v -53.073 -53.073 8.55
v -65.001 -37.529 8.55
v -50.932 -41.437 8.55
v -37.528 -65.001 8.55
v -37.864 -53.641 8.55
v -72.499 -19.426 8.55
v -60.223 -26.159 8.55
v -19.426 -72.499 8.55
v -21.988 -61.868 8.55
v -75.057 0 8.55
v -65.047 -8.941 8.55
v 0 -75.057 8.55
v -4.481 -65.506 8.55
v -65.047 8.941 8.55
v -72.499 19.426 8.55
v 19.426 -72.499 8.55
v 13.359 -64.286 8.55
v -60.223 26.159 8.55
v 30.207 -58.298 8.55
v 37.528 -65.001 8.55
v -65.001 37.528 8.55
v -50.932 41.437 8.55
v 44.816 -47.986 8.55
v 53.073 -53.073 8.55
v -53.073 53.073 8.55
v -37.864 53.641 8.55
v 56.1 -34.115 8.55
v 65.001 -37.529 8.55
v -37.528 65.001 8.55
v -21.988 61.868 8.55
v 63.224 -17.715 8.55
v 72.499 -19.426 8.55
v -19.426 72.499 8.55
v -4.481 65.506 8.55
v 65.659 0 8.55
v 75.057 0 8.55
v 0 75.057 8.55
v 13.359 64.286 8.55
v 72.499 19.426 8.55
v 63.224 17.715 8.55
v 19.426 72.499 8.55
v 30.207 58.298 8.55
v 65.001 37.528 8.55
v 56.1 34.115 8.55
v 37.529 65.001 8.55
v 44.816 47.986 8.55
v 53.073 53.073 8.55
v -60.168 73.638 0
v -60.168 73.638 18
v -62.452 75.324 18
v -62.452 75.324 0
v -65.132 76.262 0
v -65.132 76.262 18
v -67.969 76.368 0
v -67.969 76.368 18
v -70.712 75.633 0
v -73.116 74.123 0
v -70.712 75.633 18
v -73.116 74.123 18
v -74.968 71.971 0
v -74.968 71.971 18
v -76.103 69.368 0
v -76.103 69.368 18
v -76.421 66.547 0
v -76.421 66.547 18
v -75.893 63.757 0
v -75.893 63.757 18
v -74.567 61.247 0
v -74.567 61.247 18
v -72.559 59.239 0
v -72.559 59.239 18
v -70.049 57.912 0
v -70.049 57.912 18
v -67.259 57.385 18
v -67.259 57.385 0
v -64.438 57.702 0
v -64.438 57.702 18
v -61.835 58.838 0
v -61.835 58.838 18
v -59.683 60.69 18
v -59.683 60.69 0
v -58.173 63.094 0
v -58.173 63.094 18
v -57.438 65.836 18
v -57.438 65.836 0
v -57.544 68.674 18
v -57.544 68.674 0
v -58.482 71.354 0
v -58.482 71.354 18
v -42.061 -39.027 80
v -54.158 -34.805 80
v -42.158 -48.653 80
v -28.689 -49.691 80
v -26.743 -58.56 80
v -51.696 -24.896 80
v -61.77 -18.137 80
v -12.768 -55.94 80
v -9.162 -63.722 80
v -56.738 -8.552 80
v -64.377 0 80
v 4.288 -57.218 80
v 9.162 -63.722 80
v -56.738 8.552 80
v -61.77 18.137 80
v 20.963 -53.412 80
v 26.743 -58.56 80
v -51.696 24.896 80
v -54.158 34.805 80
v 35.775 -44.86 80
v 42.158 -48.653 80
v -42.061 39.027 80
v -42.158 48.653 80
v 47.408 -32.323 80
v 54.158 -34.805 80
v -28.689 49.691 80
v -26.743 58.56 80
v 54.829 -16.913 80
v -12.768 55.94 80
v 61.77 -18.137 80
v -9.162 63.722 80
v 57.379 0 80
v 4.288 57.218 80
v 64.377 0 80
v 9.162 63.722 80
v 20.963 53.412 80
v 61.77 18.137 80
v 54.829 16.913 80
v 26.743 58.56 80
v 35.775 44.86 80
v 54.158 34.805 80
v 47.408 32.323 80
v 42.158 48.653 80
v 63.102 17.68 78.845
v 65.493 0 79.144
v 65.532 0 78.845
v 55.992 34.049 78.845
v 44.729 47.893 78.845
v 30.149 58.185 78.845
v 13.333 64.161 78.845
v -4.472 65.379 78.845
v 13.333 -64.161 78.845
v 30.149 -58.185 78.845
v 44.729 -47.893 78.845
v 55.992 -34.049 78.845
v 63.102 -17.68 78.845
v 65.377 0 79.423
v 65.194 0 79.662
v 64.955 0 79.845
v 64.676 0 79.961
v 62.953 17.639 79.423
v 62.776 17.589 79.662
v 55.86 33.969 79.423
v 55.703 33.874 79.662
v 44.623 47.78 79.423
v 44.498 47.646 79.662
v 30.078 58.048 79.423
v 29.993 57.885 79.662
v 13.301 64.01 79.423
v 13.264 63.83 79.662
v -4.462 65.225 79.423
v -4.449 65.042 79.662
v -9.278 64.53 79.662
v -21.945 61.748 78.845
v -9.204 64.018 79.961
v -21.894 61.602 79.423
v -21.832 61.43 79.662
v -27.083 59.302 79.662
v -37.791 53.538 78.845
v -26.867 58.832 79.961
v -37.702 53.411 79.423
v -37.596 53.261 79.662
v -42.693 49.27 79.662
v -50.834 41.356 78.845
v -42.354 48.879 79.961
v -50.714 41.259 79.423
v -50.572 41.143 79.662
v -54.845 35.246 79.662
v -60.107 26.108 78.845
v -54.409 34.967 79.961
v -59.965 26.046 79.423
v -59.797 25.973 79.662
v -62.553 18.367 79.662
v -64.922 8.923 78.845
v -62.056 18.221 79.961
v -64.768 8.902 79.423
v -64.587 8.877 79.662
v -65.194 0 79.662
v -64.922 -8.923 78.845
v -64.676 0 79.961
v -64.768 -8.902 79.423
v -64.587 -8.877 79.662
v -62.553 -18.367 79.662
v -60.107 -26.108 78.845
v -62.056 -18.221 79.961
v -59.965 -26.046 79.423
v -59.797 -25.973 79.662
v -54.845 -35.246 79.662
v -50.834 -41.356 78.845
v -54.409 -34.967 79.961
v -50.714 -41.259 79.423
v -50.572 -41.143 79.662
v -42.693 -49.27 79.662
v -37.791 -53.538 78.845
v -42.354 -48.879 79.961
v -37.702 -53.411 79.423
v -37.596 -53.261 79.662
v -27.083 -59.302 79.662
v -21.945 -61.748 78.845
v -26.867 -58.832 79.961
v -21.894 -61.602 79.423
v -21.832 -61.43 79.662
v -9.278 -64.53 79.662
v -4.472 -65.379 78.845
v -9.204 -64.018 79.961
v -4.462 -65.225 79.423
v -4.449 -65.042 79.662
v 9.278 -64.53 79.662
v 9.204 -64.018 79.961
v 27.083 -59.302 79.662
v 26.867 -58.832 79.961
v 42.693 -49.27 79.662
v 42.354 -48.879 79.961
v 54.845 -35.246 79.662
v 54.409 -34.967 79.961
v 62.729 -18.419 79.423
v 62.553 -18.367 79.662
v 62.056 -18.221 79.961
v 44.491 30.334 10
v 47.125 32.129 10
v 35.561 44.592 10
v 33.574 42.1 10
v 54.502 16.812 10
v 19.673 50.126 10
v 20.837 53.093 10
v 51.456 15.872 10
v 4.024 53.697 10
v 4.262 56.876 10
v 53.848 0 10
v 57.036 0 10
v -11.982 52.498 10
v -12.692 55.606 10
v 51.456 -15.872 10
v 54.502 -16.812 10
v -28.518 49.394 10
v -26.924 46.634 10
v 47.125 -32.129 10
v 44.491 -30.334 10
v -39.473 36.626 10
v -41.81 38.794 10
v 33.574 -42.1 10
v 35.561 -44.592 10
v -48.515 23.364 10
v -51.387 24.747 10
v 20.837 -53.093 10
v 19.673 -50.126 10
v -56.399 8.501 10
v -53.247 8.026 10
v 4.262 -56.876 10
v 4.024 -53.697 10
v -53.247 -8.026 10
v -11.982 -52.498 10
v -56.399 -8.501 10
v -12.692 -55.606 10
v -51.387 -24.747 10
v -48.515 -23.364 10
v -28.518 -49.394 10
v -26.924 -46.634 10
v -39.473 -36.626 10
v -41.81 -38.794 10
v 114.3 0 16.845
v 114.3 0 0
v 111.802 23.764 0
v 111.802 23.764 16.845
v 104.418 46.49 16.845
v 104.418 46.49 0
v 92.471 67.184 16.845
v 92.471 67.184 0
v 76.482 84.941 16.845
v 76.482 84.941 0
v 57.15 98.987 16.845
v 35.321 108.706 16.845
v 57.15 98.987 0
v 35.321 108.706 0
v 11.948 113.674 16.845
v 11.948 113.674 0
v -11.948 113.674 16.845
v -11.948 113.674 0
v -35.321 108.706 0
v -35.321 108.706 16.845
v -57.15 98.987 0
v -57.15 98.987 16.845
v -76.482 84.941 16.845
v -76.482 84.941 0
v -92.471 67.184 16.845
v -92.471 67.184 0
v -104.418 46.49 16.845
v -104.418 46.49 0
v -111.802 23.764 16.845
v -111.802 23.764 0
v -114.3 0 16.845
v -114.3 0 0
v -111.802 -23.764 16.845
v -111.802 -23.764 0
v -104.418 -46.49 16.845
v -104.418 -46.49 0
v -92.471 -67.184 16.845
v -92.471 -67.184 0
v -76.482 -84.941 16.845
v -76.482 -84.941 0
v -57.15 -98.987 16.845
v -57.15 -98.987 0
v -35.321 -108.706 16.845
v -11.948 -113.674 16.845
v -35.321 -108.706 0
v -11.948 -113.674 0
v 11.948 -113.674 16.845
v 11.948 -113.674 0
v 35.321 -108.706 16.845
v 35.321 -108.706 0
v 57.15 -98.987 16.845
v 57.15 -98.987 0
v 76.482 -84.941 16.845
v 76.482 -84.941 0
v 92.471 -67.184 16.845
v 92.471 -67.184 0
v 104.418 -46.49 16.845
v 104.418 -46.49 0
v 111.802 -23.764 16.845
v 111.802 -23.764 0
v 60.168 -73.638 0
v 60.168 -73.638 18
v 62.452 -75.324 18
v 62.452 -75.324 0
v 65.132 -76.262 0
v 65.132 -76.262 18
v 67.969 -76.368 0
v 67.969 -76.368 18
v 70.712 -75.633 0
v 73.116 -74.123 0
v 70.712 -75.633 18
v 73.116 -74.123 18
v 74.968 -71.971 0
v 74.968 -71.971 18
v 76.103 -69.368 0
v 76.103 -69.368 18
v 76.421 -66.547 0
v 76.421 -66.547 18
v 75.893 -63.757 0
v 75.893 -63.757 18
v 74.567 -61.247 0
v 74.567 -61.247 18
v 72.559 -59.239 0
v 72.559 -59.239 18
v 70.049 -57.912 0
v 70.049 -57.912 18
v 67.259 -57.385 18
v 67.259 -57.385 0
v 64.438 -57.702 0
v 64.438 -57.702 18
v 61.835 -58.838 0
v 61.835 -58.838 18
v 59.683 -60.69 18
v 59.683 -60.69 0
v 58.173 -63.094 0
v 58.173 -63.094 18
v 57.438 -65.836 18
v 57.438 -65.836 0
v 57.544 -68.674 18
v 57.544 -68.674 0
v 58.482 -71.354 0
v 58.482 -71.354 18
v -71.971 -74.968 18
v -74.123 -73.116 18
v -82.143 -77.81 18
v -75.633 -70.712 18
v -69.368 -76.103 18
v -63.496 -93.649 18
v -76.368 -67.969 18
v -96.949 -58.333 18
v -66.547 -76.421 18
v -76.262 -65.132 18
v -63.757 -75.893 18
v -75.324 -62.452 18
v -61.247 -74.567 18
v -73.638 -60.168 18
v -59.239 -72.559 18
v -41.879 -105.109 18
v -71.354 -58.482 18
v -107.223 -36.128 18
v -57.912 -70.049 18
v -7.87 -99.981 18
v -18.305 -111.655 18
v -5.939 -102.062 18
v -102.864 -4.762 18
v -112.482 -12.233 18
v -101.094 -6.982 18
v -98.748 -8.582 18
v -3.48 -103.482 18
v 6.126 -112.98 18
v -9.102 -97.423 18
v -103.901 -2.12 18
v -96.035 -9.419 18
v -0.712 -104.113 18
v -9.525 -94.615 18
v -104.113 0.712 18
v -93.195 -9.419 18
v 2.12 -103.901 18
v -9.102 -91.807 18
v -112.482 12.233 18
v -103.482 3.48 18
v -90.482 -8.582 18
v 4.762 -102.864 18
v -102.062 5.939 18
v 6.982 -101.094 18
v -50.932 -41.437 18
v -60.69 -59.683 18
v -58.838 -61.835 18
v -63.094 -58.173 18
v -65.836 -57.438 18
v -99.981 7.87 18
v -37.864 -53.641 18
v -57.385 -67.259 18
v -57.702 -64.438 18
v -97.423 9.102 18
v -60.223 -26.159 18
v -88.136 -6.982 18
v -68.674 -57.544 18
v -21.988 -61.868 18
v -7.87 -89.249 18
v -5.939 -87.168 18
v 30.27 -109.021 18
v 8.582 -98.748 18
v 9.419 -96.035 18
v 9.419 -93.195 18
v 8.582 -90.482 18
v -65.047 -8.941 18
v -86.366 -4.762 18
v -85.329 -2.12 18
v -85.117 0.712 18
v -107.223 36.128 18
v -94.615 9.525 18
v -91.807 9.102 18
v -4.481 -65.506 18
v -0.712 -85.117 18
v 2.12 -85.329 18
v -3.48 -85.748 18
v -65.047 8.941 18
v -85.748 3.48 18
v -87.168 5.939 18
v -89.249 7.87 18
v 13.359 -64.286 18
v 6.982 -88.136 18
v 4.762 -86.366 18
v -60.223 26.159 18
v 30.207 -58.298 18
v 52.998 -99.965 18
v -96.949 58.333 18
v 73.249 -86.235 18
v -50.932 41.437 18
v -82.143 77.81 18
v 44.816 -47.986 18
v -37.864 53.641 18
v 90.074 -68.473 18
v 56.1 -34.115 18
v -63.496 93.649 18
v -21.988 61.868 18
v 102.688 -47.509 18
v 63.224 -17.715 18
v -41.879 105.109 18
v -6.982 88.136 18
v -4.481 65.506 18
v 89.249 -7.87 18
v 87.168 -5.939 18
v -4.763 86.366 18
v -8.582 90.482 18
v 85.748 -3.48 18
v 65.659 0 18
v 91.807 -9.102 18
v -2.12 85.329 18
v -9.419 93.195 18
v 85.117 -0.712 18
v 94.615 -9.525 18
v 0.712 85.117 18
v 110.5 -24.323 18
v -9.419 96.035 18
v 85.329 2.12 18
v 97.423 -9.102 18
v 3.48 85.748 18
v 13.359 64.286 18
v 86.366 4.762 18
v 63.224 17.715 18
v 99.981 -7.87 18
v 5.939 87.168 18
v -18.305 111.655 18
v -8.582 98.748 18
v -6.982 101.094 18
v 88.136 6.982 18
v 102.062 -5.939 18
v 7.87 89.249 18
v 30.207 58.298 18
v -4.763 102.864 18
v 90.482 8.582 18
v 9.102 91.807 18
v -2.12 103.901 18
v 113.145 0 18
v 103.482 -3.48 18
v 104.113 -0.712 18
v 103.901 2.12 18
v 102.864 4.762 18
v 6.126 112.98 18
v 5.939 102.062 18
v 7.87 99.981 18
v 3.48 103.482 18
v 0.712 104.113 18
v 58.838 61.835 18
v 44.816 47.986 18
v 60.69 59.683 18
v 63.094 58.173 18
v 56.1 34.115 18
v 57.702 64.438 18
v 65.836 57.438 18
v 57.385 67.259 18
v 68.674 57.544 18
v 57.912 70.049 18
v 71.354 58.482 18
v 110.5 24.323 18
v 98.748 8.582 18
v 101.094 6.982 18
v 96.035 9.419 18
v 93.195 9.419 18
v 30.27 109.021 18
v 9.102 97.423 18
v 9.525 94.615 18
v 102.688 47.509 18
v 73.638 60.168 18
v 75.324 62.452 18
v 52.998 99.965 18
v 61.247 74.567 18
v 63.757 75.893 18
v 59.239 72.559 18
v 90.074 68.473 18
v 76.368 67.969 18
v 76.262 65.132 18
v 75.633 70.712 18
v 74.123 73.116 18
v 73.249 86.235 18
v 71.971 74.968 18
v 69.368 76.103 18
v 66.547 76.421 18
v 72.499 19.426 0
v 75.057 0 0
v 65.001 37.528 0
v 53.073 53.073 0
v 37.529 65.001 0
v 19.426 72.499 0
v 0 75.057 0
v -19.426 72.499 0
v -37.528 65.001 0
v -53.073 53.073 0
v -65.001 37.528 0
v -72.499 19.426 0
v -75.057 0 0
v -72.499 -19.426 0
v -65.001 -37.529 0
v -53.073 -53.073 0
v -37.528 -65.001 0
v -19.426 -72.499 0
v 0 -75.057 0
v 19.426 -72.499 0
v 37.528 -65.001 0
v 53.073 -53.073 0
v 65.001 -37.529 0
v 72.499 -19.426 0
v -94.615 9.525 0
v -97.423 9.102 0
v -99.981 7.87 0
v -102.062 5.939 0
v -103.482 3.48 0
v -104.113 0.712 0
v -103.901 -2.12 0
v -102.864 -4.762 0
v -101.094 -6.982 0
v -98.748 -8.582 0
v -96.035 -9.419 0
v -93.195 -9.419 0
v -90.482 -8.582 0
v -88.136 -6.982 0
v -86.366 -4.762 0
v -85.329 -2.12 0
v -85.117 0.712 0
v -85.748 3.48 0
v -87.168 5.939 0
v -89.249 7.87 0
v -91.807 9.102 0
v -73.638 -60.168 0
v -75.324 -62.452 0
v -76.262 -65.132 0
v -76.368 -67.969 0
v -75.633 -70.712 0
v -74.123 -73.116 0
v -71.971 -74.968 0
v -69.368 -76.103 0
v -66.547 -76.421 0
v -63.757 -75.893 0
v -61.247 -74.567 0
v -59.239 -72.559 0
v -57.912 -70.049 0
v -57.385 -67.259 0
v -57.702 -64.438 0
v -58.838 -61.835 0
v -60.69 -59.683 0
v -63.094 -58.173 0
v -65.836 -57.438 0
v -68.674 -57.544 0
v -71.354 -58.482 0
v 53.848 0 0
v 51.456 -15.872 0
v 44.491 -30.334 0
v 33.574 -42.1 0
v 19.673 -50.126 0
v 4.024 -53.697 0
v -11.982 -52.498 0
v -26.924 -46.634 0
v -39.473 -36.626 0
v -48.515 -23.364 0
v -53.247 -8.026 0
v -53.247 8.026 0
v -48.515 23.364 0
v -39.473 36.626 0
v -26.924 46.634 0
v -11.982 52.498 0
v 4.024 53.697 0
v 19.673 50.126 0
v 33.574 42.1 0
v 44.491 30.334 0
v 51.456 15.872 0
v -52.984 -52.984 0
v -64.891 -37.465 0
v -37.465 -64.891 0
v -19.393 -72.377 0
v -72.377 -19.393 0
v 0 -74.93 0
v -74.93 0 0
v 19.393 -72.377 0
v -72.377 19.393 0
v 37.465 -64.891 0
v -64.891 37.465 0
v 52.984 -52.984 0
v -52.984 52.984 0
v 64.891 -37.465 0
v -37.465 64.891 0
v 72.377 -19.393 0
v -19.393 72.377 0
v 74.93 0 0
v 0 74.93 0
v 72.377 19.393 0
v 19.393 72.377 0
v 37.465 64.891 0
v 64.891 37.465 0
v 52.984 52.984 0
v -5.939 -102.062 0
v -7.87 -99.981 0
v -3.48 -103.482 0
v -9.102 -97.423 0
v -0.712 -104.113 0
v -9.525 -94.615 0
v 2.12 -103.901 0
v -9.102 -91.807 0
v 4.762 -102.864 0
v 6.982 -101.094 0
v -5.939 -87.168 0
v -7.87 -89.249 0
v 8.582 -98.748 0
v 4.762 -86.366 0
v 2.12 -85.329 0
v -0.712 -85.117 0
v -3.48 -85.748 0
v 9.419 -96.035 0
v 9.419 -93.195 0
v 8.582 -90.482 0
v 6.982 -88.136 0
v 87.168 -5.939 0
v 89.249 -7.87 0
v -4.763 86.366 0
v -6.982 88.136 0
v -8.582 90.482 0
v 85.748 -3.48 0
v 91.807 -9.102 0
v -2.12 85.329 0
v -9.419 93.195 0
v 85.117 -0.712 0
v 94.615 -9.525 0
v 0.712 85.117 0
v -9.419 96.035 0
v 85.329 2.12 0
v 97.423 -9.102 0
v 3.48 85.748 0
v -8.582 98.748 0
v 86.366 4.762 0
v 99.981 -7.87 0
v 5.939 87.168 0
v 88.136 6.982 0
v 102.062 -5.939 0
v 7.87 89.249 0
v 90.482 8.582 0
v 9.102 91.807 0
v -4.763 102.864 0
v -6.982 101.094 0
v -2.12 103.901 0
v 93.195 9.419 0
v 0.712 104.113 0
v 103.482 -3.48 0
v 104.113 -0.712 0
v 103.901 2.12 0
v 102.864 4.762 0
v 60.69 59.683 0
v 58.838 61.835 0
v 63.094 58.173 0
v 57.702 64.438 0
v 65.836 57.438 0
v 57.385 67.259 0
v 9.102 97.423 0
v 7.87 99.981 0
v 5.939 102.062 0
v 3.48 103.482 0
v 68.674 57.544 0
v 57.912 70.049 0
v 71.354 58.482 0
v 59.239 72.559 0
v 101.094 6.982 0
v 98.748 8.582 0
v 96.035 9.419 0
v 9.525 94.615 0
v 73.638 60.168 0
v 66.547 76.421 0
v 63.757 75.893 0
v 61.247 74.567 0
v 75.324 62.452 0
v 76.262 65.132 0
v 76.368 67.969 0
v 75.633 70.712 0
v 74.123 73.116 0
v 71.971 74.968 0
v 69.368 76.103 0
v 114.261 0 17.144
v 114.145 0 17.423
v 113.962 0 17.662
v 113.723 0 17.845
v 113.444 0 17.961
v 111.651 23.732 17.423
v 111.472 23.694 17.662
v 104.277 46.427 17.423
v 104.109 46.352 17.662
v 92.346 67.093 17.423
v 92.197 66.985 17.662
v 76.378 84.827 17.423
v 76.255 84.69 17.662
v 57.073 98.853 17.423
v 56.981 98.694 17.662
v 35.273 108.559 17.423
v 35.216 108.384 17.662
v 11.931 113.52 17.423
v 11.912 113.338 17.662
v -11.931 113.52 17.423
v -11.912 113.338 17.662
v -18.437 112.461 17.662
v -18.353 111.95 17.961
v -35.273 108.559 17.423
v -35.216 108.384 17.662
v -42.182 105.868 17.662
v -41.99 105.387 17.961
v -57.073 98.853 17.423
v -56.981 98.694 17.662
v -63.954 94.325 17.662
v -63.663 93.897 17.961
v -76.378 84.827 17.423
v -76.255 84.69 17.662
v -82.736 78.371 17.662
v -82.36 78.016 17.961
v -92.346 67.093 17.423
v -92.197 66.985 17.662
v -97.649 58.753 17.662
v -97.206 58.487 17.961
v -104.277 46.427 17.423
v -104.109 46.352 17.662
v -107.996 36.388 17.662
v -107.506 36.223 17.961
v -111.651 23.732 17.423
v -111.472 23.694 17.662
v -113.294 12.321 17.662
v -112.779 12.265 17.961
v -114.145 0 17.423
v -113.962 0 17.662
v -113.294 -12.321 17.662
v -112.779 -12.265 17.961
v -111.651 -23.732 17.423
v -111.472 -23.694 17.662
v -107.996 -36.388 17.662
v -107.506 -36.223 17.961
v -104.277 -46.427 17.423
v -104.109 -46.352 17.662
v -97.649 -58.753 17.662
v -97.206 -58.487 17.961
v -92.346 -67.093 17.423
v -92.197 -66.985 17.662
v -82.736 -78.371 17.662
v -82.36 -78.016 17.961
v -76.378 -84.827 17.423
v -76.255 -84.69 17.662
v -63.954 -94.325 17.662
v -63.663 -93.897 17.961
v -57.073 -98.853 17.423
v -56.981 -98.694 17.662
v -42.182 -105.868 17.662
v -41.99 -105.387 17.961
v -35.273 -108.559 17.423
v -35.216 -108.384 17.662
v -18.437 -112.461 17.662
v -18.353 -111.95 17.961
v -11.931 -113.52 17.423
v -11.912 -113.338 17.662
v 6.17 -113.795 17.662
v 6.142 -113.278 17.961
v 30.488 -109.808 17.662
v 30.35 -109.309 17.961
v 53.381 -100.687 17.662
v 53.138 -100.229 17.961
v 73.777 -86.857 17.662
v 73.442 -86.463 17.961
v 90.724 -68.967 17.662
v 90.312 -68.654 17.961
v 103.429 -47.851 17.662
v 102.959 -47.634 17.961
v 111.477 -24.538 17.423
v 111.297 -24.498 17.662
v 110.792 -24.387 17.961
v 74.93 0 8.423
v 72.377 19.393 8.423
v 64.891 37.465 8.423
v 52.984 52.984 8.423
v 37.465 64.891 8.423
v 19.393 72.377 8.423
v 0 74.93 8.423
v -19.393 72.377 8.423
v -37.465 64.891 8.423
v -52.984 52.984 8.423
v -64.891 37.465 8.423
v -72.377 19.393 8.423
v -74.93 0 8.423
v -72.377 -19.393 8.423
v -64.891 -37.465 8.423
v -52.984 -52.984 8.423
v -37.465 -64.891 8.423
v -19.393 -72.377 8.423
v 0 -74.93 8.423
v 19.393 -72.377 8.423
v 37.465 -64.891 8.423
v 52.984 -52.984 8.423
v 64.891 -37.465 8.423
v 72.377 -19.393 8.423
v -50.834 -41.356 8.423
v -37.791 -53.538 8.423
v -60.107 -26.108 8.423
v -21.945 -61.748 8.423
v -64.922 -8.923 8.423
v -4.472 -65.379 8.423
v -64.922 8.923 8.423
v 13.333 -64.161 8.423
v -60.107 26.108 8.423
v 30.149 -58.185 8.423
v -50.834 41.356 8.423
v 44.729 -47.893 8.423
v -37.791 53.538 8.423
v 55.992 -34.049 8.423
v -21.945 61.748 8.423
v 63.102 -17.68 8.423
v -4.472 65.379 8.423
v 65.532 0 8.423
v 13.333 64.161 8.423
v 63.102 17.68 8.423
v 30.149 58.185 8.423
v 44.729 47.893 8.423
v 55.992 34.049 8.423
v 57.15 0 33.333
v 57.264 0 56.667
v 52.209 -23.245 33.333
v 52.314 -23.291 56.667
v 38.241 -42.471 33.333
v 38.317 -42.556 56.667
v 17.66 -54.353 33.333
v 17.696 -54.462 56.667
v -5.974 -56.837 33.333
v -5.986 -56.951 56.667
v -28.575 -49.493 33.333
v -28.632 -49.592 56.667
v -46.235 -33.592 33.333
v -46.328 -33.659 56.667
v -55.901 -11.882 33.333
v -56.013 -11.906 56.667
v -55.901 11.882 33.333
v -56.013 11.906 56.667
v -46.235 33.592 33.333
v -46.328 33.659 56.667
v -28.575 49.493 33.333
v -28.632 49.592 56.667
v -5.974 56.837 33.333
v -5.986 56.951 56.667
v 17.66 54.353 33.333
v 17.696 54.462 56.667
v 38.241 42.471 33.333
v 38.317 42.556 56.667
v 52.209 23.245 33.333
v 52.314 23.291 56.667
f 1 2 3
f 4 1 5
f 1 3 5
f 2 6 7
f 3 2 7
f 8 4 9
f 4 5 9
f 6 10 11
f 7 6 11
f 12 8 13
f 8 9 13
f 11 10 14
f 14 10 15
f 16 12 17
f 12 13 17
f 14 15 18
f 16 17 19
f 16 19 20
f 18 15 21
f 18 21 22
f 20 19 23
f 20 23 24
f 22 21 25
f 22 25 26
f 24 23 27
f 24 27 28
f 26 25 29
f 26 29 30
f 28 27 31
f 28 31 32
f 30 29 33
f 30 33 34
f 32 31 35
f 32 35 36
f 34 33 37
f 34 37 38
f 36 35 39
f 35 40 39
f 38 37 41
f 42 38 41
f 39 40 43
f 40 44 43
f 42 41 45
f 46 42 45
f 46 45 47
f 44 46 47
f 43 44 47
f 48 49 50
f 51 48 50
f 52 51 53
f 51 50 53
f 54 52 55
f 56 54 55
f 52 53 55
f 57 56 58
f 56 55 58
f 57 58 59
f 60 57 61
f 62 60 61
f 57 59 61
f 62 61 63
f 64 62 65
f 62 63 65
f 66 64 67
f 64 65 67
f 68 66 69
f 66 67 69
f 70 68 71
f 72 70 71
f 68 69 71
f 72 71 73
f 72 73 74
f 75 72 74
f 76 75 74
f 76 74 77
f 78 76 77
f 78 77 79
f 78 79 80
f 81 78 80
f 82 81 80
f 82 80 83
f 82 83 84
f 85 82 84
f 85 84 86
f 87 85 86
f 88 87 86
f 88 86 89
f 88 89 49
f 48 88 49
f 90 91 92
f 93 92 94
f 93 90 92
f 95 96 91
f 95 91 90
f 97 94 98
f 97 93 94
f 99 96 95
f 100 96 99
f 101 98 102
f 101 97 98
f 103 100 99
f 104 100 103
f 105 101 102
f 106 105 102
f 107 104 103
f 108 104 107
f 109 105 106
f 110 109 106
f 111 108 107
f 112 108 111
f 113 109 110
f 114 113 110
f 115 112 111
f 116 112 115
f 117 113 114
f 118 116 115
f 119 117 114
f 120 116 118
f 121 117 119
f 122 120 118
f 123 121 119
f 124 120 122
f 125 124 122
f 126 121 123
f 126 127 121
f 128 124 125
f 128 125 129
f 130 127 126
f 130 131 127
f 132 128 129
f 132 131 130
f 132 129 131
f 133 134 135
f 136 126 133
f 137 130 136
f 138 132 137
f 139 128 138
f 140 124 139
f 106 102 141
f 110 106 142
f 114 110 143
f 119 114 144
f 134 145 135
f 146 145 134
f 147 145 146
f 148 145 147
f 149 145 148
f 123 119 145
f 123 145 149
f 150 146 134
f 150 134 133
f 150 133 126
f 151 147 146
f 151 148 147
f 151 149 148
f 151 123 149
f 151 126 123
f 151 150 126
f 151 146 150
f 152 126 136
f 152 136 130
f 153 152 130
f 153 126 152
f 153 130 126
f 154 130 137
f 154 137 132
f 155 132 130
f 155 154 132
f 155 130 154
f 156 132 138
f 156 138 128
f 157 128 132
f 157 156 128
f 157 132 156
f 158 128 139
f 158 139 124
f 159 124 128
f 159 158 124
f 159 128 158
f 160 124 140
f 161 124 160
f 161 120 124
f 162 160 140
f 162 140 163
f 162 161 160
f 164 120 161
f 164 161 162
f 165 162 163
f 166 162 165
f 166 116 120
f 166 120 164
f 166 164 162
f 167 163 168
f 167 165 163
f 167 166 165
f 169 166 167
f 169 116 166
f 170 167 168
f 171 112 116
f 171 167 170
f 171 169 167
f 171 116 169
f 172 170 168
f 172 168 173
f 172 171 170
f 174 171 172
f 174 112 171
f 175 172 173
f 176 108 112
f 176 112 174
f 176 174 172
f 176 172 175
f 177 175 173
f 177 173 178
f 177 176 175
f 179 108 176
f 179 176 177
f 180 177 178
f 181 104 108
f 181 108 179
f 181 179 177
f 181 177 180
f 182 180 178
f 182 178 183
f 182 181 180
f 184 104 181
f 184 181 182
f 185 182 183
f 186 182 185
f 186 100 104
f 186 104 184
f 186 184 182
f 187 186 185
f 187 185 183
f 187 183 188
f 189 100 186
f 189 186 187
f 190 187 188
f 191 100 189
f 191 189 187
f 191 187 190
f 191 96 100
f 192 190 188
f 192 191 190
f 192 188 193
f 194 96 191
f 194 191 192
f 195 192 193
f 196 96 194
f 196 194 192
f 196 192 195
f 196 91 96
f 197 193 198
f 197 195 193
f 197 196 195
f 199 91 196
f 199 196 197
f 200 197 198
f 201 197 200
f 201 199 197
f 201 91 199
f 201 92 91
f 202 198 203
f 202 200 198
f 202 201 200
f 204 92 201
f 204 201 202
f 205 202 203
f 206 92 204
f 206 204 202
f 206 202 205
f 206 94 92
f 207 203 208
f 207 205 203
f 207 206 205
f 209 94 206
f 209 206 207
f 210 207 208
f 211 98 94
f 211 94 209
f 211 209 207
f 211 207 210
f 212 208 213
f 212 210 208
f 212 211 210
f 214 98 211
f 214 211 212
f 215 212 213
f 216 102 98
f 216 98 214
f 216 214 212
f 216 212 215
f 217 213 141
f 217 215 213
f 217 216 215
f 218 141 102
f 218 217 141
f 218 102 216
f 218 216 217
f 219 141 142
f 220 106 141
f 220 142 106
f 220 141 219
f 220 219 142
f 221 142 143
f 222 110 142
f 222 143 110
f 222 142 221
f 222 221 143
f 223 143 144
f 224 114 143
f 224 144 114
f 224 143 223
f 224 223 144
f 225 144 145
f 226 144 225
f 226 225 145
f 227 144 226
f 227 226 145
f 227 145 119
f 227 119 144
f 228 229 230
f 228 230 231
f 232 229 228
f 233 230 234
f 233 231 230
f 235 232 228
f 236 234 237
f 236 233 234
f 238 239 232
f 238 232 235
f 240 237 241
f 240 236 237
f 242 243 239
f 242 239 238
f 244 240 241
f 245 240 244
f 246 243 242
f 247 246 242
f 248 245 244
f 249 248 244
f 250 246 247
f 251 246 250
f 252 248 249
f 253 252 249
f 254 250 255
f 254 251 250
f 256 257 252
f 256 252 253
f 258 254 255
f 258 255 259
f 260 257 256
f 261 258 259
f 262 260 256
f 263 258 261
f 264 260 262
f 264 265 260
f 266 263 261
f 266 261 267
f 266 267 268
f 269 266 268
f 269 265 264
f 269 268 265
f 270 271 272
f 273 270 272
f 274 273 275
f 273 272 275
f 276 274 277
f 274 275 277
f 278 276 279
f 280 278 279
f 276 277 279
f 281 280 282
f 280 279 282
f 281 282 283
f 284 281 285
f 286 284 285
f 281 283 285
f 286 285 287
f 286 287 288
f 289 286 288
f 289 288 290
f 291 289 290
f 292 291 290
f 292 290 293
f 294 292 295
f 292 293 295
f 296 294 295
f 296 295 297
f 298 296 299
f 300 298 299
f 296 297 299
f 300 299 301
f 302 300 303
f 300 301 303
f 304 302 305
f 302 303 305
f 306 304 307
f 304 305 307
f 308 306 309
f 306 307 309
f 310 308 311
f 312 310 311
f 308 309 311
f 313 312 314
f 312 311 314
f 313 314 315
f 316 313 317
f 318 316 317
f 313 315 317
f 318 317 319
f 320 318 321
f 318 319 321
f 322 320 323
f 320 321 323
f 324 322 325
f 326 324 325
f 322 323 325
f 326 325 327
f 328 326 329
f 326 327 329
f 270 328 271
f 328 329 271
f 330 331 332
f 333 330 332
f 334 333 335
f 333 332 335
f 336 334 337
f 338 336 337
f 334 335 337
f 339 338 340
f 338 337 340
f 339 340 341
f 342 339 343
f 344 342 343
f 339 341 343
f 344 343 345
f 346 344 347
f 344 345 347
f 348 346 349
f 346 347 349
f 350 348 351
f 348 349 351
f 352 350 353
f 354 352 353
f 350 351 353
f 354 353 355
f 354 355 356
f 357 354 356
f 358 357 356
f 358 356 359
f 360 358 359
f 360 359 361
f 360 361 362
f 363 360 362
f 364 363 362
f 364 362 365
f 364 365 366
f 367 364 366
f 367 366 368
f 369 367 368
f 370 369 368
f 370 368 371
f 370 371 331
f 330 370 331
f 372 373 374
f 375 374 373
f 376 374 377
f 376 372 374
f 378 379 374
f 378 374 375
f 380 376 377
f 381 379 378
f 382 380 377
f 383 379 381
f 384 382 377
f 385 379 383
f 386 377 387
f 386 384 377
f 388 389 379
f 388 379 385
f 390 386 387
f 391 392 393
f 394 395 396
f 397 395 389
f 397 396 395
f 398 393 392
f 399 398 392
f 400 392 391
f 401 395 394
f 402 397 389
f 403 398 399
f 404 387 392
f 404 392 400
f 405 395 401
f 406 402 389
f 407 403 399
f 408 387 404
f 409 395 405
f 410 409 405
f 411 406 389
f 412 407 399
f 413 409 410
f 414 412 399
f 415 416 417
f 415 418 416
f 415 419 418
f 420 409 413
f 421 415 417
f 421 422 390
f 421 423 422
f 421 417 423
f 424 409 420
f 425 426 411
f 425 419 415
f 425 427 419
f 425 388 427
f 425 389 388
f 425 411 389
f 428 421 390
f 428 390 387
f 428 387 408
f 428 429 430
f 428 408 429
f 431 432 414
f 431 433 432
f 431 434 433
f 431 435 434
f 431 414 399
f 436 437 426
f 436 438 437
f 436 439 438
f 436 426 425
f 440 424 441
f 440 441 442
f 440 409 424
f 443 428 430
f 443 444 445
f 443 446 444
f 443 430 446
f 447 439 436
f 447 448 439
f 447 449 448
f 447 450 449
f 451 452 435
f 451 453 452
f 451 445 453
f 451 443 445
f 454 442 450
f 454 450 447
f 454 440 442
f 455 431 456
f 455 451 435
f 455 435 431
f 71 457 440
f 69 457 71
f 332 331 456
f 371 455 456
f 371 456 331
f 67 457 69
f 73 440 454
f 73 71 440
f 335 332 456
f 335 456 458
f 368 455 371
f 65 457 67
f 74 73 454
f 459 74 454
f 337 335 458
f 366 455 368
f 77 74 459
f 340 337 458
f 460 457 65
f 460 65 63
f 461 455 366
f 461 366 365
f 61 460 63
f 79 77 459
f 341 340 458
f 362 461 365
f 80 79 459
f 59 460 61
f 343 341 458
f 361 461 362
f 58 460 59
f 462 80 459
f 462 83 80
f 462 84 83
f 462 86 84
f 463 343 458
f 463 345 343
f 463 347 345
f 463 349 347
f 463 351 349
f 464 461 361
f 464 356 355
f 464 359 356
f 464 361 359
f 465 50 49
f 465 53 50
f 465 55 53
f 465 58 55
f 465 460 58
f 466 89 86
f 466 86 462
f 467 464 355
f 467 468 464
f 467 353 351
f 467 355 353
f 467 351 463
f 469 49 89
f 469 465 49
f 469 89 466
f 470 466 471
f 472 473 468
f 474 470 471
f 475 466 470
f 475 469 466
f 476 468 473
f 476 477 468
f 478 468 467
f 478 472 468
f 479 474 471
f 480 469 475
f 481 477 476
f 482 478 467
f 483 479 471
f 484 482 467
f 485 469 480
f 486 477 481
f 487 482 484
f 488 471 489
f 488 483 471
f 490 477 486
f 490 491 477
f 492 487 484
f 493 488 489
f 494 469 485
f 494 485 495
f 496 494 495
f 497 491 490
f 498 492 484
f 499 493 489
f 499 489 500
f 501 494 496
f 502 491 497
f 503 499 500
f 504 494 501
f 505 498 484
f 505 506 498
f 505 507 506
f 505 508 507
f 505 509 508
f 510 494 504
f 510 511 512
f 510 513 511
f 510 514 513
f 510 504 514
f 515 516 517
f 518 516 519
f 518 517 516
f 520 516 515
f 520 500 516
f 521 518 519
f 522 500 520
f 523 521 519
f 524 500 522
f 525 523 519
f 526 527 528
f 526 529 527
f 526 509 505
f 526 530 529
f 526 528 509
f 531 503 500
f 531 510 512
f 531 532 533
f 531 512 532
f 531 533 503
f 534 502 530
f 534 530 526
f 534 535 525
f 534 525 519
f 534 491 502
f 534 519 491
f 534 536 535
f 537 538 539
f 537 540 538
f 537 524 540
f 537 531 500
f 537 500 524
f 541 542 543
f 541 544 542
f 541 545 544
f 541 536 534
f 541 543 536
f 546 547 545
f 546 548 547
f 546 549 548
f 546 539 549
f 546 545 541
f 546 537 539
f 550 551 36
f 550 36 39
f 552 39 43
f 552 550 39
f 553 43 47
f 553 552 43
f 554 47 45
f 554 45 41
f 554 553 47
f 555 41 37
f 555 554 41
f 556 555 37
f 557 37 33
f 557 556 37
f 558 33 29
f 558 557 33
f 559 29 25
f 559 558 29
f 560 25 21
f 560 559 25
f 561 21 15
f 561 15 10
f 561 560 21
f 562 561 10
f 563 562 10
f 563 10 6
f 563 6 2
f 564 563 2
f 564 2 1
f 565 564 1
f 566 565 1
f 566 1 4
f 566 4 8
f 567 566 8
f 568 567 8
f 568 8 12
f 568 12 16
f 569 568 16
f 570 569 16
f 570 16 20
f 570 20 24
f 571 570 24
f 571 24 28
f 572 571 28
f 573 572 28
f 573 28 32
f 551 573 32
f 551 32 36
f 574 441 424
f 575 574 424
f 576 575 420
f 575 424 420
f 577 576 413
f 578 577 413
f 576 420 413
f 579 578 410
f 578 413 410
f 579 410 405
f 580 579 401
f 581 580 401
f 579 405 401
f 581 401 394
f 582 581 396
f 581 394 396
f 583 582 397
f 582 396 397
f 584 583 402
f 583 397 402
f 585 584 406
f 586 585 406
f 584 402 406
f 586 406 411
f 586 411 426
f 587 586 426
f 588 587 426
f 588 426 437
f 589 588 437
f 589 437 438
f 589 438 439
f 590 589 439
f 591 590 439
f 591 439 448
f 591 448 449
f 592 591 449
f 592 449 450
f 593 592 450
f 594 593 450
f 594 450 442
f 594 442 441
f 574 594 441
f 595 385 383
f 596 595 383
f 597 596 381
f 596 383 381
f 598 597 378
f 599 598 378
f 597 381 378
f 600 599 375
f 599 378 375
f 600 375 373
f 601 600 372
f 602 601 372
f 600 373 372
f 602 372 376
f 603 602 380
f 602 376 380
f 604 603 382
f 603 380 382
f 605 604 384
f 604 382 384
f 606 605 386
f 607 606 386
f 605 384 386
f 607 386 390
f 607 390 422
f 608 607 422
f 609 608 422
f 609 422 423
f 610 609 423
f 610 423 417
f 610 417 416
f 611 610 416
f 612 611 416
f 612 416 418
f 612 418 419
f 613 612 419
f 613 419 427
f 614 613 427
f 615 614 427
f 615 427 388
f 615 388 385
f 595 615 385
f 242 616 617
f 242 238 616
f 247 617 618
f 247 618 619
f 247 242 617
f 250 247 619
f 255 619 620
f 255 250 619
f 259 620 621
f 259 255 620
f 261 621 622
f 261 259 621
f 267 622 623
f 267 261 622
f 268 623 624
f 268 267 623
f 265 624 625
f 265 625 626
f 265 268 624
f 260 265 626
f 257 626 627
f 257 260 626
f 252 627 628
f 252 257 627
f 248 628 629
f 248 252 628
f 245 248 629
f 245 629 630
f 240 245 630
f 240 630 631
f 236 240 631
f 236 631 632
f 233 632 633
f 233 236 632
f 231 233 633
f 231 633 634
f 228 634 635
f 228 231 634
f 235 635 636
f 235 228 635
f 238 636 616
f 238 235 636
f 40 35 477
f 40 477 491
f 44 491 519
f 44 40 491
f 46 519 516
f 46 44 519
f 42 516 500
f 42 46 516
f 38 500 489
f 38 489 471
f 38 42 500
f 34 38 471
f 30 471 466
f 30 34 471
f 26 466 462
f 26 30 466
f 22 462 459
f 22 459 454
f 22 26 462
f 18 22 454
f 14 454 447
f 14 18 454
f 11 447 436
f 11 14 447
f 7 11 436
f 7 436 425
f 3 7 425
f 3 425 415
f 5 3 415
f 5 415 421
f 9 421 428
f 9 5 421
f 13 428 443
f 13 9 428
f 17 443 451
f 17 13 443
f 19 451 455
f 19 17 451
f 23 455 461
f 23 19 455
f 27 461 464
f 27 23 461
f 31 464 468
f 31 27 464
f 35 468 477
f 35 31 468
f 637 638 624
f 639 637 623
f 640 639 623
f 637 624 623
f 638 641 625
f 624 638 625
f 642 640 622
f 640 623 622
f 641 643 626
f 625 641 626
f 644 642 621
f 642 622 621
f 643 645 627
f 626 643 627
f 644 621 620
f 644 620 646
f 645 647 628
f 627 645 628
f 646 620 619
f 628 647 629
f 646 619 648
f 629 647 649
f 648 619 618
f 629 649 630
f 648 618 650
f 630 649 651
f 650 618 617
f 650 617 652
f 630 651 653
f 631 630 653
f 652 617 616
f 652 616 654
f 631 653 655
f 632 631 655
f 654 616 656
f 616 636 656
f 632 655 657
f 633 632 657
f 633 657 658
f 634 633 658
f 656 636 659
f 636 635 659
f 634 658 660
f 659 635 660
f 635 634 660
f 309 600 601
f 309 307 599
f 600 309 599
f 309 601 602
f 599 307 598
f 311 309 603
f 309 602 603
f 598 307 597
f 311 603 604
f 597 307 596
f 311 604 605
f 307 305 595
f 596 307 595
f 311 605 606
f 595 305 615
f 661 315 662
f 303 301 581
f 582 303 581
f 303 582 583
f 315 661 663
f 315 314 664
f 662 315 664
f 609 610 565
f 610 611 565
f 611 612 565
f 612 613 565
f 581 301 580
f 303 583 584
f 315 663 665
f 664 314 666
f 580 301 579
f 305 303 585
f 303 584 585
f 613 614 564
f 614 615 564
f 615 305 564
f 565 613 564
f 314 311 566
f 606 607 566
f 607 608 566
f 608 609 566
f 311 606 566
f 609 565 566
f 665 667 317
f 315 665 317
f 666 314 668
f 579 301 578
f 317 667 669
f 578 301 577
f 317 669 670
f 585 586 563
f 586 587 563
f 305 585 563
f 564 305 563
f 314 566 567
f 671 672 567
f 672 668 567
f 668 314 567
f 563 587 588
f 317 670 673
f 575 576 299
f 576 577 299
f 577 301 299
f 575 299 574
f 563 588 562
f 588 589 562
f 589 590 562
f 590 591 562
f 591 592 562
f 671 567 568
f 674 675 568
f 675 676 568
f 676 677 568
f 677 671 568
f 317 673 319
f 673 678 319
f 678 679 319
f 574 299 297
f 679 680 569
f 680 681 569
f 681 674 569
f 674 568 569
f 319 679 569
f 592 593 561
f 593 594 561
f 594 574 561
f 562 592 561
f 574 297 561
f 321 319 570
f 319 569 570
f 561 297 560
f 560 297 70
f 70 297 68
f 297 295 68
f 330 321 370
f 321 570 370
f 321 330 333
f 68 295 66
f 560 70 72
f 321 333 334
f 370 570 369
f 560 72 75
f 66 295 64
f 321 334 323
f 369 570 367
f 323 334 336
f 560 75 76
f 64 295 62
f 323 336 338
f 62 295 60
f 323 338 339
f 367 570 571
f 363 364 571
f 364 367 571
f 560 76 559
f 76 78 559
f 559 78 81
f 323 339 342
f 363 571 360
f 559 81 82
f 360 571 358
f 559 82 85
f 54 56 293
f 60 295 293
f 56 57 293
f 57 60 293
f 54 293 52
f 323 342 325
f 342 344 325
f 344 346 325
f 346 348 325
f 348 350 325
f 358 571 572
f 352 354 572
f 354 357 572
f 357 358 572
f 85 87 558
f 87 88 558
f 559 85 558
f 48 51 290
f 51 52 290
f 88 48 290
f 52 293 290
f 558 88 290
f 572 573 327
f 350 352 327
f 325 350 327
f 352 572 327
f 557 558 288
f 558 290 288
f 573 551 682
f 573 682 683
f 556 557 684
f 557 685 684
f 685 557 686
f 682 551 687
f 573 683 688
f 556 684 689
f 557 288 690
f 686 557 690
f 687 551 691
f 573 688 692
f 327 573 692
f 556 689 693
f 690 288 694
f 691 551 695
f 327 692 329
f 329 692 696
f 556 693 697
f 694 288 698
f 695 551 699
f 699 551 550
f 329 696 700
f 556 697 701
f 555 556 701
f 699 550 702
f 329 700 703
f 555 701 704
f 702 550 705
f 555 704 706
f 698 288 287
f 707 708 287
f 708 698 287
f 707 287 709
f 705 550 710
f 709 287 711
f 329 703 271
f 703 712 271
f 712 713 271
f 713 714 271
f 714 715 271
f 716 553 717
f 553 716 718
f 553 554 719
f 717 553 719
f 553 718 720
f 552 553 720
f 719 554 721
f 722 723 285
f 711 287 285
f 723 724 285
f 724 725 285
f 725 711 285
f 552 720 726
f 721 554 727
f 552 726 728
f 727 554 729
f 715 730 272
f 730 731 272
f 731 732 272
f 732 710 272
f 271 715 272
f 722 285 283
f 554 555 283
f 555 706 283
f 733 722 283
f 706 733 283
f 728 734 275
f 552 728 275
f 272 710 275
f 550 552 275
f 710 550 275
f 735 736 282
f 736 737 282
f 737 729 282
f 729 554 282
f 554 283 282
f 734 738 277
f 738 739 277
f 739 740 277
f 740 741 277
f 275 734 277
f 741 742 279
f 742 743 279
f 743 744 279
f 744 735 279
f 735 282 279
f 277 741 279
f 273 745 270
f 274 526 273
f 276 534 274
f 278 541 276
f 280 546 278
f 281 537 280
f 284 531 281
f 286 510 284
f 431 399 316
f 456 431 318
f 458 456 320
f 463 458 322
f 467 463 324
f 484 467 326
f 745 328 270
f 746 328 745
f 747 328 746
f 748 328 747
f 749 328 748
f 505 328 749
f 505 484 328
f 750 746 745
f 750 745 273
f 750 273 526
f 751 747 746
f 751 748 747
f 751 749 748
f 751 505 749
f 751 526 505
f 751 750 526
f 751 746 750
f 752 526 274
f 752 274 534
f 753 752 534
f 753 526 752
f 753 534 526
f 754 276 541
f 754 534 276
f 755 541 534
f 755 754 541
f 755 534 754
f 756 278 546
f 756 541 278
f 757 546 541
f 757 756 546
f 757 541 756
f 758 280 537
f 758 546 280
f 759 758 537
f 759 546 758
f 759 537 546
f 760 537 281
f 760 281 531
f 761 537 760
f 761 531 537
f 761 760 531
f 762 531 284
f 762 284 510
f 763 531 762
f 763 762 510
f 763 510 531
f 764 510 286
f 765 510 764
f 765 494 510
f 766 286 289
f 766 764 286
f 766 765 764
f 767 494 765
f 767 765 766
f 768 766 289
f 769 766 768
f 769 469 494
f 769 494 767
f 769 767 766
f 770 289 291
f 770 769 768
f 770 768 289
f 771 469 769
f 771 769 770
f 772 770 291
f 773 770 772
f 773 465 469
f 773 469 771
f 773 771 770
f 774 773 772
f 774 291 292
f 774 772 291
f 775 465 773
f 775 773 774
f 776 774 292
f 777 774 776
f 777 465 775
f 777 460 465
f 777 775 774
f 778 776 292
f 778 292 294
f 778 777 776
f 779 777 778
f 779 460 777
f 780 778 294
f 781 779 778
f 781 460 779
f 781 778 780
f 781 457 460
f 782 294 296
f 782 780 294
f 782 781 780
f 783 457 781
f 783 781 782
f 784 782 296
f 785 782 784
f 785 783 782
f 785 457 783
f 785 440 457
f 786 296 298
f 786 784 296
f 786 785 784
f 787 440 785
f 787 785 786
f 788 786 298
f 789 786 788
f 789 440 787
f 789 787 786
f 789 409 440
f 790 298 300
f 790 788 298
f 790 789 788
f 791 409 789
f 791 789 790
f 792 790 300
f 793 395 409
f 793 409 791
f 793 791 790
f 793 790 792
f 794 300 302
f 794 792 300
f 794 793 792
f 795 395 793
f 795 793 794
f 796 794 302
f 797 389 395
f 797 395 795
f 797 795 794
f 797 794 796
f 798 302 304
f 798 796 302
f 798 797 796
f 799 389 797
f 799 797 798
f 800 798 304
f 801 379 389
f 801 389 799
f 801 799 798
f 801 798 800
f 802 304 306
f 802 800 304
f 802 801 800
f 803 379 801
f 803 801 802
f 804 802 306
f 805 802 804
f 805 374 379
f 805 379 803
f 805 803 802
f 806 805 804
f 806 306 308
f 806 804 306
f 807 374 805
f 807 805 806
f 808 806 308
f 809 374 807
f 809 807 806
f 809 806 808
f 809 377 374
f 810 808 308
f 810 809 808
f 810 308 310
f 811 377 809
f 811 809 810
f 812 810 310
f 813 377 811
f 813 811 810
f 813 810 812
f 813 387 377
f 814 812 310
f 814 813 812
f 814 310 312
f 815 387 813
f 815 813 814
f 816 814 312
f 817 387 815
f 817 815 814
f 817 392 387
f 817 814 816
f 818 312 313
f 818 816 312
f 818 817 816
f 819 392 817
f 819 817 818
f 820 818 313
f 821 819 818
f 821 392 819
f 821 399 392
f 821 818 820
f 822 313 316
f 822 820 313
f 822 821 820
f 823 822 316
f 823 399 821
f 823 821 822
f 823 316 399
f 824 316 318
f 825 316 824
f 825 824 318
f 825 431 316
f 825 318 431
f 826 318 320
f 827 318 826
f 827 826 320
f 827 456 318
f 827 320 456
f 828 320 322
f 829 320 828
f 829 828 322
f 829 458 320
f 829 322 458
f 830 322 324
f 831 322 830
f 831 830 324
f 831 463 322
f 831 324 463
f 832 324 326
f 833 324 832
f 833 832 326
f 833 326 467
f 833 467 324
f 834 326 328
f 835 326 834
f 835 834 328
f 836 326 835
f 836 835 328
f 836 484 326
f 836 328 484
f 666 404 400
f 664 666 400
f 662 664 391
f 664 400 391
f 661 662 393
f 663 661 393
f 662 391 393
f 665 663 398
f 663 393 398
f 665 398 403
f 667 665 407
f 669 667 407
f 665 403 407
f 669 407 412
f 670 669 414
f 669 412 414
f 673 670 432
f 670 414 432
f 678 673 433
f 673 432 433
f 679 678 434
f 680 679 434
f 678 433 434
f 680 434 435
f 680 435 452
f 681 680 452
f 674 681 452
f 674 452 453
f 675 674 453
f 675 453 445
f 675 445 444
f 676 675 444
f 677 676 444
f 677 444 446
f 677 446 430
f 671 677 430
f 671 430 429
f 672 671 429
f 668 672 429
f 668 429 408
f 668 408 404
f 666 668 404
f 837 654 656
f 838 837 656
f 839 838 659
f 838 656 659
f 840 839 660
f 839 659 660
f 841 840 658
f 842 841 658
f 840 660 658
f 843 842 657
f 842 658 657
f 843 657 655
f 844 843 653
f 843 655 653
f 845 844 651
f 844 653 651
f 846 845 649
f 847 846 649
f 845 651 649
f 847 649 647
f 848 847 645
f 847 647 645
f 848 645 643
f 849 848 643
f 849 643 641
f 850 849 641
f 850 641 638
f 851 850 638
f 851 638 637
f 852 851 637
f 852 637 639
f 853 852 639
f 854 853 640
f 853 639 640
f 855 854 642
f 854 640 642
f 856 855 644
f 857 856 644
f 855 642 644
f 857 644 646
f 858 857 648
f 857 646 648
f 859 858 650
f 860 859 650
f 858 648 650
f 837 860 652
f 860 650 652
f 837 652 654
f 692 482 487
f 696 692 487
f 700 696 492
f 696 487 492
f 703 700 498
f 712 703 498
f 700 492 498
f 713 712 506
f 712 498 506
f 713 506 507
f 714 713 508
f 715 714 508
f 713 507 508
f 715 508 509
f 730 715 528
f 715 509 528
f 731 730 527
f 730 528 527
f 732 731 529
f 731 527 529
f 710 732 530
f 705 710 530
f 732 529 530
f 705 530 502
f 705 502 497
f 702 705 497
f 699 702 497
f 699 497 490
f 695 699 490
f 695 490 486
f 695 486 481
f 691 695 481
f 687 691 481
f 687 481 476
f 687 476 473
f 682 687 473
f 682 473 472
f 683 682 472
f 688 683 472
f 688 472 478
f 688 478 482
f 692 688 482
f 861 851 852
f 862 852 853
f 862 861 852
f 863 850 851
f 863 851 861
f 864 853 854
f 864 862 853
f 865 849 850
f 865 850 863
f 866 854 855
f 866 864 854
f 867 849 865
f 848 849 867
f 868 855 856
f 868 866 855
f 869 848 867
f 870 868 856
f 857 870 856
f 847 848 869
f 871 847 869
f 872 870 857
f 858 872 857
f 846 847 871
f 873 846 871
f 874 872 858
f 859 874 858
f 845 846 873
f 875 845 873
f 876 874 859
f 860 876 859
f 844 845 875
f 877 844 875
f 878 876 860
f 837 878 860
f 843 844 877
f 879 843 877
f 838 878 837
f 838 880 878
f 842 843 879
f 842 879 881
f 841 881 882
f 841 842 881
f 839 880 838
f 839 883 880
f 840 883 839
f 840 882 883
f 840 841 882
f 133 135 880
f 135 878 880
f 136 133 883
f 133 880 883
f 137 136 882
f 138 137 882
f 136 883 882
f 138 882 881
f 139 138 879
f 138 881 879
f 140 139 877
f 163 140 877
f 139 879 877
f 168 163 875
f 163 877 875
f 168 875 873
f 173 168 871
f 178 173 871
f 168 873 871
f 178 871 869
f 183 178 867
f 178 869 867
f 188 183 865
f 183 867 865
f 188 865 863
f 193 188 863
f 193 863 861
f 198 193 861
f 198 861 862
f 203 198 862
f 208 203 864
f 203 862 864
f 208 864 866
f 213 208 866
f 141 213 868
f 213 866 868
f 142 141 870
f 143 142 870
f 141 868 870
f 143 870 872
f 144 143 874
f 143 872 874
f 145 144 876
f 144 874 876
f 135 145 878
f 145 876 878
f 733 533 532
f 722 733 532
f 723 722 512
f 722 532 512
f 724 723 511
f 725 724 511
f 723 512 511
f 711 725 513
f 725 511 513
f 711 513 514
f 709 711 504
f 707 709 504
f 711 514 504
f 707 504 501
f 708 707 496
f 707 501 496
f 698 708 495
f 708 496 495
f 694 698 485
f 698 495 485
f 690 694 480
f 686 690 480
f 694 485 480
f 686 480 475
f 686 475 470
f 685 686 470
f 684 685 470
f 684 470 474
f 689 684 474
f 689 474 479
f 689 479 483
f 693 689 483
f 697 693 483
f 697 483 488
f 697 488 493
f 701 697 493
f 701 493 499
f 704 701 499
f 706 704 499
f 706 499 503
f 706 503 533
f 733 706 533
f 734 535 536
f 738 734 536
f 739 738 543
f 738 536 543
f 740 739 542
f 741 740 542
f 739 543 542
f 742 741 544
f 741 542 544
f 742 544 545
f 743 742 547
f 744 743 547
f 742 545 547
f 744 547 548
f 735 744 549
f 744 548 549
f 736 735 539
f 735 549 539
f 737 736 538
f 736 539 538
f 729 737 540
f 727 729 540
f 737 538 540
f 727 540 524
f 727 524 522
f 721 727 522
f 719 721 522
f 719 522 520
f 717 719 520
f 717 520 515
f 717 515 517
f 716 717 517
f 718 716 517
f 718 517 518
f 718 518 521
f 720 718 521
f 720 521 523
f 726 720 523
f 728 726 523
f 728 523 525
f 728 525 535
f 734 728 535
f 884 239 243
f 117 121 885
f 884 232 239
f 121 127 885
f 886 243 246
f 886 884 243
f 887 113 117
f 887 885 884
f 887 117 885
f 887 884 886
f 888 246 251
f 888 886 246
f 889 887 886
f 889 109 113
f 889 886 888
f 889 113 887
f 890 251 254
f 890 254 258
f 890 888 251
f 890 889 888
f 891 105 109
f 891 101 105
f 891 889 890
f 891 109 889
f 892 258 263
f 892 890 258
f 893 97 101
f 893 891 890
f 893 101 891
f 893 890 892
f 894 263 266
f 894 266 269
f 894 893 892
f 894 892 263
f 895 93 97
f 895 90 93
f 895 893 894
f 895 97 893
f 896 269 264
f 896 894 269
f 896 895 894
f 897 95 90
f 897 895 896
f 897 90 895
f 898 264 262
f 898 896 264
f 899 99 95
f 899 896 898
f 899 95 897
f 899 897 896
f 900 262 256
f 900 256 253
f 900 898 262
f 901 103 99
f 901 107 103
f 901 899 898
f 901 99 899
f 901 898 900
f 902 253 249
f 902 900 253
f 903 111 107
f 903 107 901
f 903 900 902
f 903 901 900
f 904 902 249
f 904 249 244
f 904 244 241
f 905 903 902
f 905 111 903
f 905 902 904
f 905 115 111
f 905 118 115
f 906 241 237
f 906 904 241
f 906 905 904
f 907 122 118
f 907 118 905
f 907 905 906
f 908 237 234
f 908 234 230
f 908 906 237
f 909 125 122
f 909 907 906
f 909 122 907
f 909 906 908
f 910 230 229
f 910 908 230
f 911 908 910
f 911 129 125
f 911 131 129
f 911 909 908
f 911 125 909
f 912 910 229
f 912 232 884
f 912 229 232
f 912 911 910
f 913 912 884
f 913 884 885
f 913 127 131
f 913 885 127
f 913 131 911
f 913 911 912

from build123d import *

# Parameters (mm, degrees)
SKETCH1_R                       = 114.3
EXTRUDE1_DEPTH                  = 18
SKETCH2_R                       = 65.532
EXTRUDE2_DEPTH                  = 62
SKETCH3_R                       = 9.525
EXTRUDE3_DEPTH                  = 174.127063165
CIRPATTERN1_COUNT               = 8
FILLET1_R                       = 1.154545455
CUT_REVOLVE_THIN1_START         = 8.422727273
CUT_REVOLVE_THIN1_OUTLINE_R     = 75.057
CUT_REVOLVE_THIN1_OUTLINE_R_2   = 65.532
CUT_REVOLVE_THIN1_DEPTH         = 0.127
CUT_REVOLVE_THIN1_2_OUTLINE_R   = 75.057
CUT_REVOLVE_THIN1_2_OUTLINE_R_2 = 74.93
CUT_REVOLVE_THIN1_2_DEPTH       = 8.422727273
CUT_REVOLVE_THIN1_START_2       = 8.549727273
CUT_REVOLVE_THIN1_3_OUTLINE_R   = 65.659
CUT_REVOLVE_THIN1_3_OUTLINE_R_2 = 65.532
CUT_REVOLVE_THIN1_3_DEPTH       = 9.450272727


# Read off the part's stored shape, not the designer's step: Cut-Revolve-Thin1
with BuildPart() as part:
    # Sketch1 → Extrude1 (new body)
    with BuildSketch(Plane.XY):
        Circle(SKETCH1_R)
    extrude(amount=EXTRUDE1_DEPTH)

    # Sketch2 → Extrude2 (add)
    with BuildSketch(Plane.XY.offset(18)):
        Circle(SKETCH2_R)
    extrude(amount=EXTRUDE2_DEPTH)

    # Sketch3 → Extrude3 (cut, through all)
    with BuildSketch(Plane.XY.offset(18)):
        with Locations((0, 94.615)):
            Circle(SKETCH3_R)
    extrude3 = extrude(amount=-EXTRUDE3_DEPTH, mode=Mode.SUBTRACT)

    # CirPattern1: Extrude3 ×8 about axis
    cirpattern1_axis = Axis((0, 0, 0), (0, 0, 1))
    for i in range(1, CIRPATTERN1_COUNT):
        add(extrude3.rotate(cirpattern1_axis, i * 360 / CIRPATTERN1_COUNT), mode=Mode.SUBTRACT)

    # Fillet1
    fillet1_edges = [part.edges().sort_by_distance(p)[0] for p in [
        (-114.3, 0, 18),
        (-65.532, 0, 80),
    ]]
    fillet(fillet1_edges, radius=FILLET1_R)

    # Sketch4 → Cut-Revolve1 (revolve, cut)
    with BuildSketch(Plane(origin=(0, 0, 62.70625), x_dir=(0, 0, 1), z_dir=(-1, 0, 0)), mode=Mode.PRIVATE) as cut_revolve1_sk:
        Polygon((-62.70625, 53.848), (-52.70625, 53.848), (-52.70625, 57.0357), (17.29375, 57.3786), (17.29375, 0), (-62.70625, 0), align=None)
    revolve(cut_revolve1_sk.sketch.rotate(Axis((0, 0, 80), (0, 0, -1)), 90), axis=Axis((0, 0, 80), (0, 0, -1)), mode=Mode.SUBTRACT)

    # Cut-Revolve-Thin1 outline → Cut-Revolve-Thin1 (cut)
    with BuildSketch(Plane.XY.offset(CUT_REVOLVE_THIN1_START)):
        Circle(CUT_REVOLVE_THIN1_OUTLINE_R)
        Circle(CUT_REVOLVE_THIN1_OUTLINE_R_2, mode=Mode.SUBTRACT)
    extrude(amount=CUT_REVOLVE_THIN1_DEPTH, mode=Mode.SUBTRACT)

    # Cut-Revolve-Thin1 2 outline → Cut-Revolve-Thin1 2 (cut)
    with BuildSketch(Plane.XY):
        Circle(CUT_REVOLVE_THIN1_2_OUTLINE_R)
        Circle(CUT_REVOLVE_THIN1_2_OUTLINE_R_2, mode=Mode.SUBTRACT)
    extrude(amount=CUT_REVOLVE_THIN1_2_DEPTH, mode=Mode.SUBTRACT)

    # Cut-Revolve-Thin1 3 outline → Cut-Revolve-Thin1 3 (cut)
    with BuildSketch(Plane.XY.offset(CUT_REVOLVE_THIN1_START_2)):
        Circle(CUT_REVOLVE_THIN1_3_OUTLINE_R)
        Circle(CUT_REVOLVE_THIN1_3_OUTLINE_R_2, mode=Mode.SUBTRACT)
    extrude(amount=CUT_REVOLVE_THIN1_3_DEPTH, mode=Mode.SUBTRACT)


solid = part.part
